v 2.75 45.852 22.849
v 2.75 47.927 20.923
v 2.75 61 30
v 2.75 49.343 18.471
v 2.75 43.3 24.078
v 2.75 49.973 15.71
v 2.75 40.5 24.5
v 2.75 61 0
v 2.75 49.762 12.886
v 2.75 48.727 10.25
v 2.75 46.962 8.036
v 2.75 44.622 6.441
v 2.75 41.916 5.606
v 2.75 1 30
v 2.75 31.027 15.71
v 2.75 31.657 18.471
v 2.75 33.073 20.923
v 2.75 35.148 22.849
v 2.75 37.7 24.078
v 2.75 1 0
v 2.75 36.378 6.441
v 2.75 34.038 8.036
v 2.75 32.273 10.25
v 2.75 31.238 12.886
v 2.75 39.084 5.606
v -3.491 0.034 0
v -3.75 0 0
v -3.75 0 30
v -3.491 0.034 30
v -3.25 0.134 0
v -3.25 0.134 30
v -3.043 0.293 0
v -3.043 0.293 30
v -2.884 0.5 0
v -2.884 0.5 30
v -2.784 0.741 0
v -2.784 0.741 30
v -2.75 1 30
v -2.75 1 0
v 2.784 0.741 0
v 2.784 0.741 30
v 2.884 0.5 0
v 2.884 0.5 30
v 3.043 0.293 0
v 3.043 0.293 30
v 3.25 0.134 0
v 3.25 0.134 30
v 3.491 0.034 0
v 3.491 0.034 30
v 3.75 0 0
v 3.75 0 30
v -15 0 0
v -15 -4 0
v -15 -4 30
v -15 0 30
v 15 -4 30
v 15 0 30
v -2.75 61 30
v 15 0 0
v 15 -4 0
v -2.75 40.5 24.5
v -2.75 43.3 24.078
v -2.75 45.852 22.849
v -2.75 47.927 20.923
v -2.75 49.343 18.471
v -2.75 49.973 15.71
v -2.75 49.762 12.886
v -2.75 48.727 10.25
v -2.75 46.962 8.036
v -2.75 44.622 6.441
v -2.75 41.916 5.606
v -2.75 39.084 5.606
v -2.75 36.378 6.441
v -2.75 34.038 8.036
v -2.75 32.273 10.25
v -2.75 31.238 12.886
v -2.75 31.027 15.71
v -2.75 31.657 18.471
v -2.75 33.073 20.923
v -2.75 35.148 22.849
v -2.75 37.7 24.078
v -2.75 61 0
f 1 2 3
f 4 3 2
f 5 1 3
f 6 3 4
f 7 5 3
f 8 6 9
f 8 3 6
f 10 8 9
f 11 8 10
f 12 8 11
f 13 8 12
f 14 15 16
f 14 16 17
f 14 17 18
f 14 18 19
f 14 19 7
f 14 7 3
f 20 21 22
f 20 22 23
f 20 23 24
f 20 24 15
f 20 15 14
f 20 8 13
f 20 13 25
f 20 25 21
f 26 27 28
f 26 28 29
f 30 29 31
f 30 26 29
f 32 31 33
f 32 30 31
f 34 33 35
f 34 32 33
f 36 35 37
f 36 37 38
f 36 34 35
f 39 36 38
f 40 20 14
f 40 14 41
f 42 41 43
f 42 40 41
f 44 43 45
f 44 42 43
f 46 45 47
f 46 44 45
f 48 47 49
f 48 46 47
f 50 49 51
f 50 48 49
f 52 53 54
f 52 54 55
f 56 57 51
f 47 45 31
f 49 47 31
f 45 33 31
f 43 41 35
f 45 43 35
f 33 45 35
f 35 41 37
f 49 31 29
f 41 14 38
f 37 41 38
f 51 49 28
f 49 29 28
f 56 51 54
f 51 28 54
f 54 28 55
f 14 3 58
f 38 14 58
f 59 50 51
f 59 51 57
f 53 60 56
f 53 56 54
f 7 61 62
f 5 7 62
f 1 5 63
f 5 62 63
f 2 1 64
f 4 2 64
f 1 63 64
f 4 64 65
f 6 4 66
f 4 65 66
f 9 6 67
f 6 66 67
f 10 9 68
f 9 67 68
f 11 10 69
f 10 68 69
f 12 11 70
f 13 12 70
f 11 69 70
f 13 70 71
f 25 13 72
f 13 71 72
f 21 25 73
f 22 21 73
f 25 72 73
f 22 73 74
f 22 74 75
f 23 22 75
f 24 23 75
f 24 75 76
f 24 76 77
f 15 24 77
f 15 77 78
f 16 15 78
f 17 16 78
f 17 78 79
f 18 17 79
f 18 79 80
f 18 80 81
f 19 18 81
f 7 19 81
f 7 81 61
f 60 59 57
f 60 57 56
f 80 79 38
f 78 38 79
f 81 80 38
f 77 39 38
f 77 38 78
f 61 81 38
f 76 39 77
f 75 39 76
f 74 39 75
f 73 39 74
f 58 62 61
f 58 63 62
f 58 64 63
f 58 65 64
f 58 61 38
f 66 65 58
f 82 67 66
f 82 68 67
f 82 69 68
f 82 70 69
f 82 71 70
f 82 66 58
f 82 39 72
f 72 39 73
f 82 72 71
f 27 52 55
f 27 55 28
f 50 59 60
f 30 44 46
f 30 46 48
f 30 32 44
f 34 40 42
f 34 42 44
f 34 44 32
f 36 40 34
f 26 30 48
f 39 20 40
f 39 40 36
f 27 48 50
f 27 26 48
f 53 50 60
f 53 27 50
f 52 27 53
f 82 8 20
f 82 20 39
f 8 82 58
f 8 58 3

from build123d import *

# Parameters (mm, degrees)
BOSS_EXTRUDE1_DEPTH = 30
SKETCH2_R           = 9.5
CUT_EXTRUDE1_DEPTH  = 70


with BuildPart() as part:
    # Sketch1 → Boss-Extrude1 (new body)
    with BuildSketch(Plane.XY):
        with BuildLine():
            Line((3.75, 0), (15, 0))
            Line((15, 0), (15, -4))
            Line((15, -4), (-15, -4))
            Line((-15, -4), (-15, 0))
            Line((-15, 0), (-3.75, 0))
            ThreePointArc((-3.75, 0), (-3.042893219, 0.292893219), (-2.75, 1))
            Line((-2.75, 1), (-2.75, 61))
            Line((-2.75, 61), (2.75, 61))
            Line((2.75, 61), (2.75, 1))
            ThreePointArc((2.75, 1), (3.042893219, 0.292893219), (3.75, 0))
        make_face()
    extrude(amount=BOSS_EXTRUDE1_DEPTH)

    # Sketch2 → Cut-Extrude1 (cut)
    with BuildSketch(Plane.ZY.offset(2.75)):
        with Locations((15, 40.5)):
            Circle(SKETCH2_R)
    extrude(amount=-CUT_EXTRUDE1_DEPTH, mode=Mode.SUBTRACT)


solid = part.part
